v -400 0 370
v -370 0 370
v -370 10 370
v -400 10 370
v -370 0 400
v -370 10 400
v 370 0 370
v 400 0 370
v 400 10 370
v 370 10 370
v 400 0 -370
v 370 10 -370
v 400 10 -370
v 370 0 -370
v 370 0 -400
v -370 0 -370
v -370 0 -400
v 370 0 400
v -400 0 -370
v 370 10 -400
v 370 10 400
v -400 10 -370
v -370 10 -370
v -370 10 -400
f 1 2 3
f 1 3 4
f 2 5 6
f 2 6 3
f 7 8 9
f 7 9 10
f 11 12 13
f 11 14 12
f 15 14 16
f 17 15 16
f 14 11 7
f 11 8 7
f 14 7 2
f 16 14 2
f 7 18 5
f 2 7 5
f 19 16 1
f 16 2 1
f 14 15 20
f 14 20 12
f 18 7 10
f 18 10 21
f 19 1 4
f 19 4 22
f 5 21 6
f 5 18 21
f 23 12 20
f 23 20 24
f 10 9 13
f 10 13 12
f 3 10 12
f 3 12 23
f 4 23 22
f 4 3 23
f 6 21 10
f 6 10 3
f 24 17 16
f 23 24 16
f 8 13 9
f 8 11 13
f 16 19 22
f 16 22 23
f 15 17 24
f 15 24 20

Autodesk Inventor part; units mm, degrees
ref_plane "YZ Plane" through (0, 0, 0) normal (1, 0, 0) x (0, 1, 0)
ref_plane "XZ Plane" through (0, 0, 0) normal (0, 1, 0) x (-1, 0, 0)
ref_plane "XY Plane" through (0, 0, 0) normal (0, 0, 1) x (1, 0, 0)
sketch "스케치1" plane through (0, 0, 0) normal (0, 1, 0) x (-1, 0, 0)
  line L0 (370, -400) -> (-370, -400)
  line L1 (-370, -400) -> (-370, -370)
  line L2 (-370, -370) -> (-400, -370)
  line L3 (-400, -370) -> (-400, 370)
  line L4 (-400, 370) -> (-370, 370)
  line L5 (-370, 370) -> (-370, 400)
  line L6 (-370, 400) -> (370, 400)
  line L7 (370, 400) -> (370, 370)
  line L8 (370, 370) -> (400, 370)
  line L9 (400, 370) -> (400, -370)
  line L10 (400, -370) -> (370, -370)
  line L11 (370, -400) -> (370, -370)
  point P0 (0, 0)
  dimension "d6" = 740
  dimension "d7" = 740
  dimension "d8" = 30
  dimension "d9" = 30
  dimension "d10" = 30
  dimension "d11" = 30
  dimension "d12" = 30
  dimension "d13" = 30
  dimension "d14" = 30
  dimension "d15" = 30
  dimension "d17" = 400
  dimension "d18" = 400
extrude "돌출1" add sketch "스케치1" along normal blind 10
properties part number "plate1" material "알루미늄 6061"
